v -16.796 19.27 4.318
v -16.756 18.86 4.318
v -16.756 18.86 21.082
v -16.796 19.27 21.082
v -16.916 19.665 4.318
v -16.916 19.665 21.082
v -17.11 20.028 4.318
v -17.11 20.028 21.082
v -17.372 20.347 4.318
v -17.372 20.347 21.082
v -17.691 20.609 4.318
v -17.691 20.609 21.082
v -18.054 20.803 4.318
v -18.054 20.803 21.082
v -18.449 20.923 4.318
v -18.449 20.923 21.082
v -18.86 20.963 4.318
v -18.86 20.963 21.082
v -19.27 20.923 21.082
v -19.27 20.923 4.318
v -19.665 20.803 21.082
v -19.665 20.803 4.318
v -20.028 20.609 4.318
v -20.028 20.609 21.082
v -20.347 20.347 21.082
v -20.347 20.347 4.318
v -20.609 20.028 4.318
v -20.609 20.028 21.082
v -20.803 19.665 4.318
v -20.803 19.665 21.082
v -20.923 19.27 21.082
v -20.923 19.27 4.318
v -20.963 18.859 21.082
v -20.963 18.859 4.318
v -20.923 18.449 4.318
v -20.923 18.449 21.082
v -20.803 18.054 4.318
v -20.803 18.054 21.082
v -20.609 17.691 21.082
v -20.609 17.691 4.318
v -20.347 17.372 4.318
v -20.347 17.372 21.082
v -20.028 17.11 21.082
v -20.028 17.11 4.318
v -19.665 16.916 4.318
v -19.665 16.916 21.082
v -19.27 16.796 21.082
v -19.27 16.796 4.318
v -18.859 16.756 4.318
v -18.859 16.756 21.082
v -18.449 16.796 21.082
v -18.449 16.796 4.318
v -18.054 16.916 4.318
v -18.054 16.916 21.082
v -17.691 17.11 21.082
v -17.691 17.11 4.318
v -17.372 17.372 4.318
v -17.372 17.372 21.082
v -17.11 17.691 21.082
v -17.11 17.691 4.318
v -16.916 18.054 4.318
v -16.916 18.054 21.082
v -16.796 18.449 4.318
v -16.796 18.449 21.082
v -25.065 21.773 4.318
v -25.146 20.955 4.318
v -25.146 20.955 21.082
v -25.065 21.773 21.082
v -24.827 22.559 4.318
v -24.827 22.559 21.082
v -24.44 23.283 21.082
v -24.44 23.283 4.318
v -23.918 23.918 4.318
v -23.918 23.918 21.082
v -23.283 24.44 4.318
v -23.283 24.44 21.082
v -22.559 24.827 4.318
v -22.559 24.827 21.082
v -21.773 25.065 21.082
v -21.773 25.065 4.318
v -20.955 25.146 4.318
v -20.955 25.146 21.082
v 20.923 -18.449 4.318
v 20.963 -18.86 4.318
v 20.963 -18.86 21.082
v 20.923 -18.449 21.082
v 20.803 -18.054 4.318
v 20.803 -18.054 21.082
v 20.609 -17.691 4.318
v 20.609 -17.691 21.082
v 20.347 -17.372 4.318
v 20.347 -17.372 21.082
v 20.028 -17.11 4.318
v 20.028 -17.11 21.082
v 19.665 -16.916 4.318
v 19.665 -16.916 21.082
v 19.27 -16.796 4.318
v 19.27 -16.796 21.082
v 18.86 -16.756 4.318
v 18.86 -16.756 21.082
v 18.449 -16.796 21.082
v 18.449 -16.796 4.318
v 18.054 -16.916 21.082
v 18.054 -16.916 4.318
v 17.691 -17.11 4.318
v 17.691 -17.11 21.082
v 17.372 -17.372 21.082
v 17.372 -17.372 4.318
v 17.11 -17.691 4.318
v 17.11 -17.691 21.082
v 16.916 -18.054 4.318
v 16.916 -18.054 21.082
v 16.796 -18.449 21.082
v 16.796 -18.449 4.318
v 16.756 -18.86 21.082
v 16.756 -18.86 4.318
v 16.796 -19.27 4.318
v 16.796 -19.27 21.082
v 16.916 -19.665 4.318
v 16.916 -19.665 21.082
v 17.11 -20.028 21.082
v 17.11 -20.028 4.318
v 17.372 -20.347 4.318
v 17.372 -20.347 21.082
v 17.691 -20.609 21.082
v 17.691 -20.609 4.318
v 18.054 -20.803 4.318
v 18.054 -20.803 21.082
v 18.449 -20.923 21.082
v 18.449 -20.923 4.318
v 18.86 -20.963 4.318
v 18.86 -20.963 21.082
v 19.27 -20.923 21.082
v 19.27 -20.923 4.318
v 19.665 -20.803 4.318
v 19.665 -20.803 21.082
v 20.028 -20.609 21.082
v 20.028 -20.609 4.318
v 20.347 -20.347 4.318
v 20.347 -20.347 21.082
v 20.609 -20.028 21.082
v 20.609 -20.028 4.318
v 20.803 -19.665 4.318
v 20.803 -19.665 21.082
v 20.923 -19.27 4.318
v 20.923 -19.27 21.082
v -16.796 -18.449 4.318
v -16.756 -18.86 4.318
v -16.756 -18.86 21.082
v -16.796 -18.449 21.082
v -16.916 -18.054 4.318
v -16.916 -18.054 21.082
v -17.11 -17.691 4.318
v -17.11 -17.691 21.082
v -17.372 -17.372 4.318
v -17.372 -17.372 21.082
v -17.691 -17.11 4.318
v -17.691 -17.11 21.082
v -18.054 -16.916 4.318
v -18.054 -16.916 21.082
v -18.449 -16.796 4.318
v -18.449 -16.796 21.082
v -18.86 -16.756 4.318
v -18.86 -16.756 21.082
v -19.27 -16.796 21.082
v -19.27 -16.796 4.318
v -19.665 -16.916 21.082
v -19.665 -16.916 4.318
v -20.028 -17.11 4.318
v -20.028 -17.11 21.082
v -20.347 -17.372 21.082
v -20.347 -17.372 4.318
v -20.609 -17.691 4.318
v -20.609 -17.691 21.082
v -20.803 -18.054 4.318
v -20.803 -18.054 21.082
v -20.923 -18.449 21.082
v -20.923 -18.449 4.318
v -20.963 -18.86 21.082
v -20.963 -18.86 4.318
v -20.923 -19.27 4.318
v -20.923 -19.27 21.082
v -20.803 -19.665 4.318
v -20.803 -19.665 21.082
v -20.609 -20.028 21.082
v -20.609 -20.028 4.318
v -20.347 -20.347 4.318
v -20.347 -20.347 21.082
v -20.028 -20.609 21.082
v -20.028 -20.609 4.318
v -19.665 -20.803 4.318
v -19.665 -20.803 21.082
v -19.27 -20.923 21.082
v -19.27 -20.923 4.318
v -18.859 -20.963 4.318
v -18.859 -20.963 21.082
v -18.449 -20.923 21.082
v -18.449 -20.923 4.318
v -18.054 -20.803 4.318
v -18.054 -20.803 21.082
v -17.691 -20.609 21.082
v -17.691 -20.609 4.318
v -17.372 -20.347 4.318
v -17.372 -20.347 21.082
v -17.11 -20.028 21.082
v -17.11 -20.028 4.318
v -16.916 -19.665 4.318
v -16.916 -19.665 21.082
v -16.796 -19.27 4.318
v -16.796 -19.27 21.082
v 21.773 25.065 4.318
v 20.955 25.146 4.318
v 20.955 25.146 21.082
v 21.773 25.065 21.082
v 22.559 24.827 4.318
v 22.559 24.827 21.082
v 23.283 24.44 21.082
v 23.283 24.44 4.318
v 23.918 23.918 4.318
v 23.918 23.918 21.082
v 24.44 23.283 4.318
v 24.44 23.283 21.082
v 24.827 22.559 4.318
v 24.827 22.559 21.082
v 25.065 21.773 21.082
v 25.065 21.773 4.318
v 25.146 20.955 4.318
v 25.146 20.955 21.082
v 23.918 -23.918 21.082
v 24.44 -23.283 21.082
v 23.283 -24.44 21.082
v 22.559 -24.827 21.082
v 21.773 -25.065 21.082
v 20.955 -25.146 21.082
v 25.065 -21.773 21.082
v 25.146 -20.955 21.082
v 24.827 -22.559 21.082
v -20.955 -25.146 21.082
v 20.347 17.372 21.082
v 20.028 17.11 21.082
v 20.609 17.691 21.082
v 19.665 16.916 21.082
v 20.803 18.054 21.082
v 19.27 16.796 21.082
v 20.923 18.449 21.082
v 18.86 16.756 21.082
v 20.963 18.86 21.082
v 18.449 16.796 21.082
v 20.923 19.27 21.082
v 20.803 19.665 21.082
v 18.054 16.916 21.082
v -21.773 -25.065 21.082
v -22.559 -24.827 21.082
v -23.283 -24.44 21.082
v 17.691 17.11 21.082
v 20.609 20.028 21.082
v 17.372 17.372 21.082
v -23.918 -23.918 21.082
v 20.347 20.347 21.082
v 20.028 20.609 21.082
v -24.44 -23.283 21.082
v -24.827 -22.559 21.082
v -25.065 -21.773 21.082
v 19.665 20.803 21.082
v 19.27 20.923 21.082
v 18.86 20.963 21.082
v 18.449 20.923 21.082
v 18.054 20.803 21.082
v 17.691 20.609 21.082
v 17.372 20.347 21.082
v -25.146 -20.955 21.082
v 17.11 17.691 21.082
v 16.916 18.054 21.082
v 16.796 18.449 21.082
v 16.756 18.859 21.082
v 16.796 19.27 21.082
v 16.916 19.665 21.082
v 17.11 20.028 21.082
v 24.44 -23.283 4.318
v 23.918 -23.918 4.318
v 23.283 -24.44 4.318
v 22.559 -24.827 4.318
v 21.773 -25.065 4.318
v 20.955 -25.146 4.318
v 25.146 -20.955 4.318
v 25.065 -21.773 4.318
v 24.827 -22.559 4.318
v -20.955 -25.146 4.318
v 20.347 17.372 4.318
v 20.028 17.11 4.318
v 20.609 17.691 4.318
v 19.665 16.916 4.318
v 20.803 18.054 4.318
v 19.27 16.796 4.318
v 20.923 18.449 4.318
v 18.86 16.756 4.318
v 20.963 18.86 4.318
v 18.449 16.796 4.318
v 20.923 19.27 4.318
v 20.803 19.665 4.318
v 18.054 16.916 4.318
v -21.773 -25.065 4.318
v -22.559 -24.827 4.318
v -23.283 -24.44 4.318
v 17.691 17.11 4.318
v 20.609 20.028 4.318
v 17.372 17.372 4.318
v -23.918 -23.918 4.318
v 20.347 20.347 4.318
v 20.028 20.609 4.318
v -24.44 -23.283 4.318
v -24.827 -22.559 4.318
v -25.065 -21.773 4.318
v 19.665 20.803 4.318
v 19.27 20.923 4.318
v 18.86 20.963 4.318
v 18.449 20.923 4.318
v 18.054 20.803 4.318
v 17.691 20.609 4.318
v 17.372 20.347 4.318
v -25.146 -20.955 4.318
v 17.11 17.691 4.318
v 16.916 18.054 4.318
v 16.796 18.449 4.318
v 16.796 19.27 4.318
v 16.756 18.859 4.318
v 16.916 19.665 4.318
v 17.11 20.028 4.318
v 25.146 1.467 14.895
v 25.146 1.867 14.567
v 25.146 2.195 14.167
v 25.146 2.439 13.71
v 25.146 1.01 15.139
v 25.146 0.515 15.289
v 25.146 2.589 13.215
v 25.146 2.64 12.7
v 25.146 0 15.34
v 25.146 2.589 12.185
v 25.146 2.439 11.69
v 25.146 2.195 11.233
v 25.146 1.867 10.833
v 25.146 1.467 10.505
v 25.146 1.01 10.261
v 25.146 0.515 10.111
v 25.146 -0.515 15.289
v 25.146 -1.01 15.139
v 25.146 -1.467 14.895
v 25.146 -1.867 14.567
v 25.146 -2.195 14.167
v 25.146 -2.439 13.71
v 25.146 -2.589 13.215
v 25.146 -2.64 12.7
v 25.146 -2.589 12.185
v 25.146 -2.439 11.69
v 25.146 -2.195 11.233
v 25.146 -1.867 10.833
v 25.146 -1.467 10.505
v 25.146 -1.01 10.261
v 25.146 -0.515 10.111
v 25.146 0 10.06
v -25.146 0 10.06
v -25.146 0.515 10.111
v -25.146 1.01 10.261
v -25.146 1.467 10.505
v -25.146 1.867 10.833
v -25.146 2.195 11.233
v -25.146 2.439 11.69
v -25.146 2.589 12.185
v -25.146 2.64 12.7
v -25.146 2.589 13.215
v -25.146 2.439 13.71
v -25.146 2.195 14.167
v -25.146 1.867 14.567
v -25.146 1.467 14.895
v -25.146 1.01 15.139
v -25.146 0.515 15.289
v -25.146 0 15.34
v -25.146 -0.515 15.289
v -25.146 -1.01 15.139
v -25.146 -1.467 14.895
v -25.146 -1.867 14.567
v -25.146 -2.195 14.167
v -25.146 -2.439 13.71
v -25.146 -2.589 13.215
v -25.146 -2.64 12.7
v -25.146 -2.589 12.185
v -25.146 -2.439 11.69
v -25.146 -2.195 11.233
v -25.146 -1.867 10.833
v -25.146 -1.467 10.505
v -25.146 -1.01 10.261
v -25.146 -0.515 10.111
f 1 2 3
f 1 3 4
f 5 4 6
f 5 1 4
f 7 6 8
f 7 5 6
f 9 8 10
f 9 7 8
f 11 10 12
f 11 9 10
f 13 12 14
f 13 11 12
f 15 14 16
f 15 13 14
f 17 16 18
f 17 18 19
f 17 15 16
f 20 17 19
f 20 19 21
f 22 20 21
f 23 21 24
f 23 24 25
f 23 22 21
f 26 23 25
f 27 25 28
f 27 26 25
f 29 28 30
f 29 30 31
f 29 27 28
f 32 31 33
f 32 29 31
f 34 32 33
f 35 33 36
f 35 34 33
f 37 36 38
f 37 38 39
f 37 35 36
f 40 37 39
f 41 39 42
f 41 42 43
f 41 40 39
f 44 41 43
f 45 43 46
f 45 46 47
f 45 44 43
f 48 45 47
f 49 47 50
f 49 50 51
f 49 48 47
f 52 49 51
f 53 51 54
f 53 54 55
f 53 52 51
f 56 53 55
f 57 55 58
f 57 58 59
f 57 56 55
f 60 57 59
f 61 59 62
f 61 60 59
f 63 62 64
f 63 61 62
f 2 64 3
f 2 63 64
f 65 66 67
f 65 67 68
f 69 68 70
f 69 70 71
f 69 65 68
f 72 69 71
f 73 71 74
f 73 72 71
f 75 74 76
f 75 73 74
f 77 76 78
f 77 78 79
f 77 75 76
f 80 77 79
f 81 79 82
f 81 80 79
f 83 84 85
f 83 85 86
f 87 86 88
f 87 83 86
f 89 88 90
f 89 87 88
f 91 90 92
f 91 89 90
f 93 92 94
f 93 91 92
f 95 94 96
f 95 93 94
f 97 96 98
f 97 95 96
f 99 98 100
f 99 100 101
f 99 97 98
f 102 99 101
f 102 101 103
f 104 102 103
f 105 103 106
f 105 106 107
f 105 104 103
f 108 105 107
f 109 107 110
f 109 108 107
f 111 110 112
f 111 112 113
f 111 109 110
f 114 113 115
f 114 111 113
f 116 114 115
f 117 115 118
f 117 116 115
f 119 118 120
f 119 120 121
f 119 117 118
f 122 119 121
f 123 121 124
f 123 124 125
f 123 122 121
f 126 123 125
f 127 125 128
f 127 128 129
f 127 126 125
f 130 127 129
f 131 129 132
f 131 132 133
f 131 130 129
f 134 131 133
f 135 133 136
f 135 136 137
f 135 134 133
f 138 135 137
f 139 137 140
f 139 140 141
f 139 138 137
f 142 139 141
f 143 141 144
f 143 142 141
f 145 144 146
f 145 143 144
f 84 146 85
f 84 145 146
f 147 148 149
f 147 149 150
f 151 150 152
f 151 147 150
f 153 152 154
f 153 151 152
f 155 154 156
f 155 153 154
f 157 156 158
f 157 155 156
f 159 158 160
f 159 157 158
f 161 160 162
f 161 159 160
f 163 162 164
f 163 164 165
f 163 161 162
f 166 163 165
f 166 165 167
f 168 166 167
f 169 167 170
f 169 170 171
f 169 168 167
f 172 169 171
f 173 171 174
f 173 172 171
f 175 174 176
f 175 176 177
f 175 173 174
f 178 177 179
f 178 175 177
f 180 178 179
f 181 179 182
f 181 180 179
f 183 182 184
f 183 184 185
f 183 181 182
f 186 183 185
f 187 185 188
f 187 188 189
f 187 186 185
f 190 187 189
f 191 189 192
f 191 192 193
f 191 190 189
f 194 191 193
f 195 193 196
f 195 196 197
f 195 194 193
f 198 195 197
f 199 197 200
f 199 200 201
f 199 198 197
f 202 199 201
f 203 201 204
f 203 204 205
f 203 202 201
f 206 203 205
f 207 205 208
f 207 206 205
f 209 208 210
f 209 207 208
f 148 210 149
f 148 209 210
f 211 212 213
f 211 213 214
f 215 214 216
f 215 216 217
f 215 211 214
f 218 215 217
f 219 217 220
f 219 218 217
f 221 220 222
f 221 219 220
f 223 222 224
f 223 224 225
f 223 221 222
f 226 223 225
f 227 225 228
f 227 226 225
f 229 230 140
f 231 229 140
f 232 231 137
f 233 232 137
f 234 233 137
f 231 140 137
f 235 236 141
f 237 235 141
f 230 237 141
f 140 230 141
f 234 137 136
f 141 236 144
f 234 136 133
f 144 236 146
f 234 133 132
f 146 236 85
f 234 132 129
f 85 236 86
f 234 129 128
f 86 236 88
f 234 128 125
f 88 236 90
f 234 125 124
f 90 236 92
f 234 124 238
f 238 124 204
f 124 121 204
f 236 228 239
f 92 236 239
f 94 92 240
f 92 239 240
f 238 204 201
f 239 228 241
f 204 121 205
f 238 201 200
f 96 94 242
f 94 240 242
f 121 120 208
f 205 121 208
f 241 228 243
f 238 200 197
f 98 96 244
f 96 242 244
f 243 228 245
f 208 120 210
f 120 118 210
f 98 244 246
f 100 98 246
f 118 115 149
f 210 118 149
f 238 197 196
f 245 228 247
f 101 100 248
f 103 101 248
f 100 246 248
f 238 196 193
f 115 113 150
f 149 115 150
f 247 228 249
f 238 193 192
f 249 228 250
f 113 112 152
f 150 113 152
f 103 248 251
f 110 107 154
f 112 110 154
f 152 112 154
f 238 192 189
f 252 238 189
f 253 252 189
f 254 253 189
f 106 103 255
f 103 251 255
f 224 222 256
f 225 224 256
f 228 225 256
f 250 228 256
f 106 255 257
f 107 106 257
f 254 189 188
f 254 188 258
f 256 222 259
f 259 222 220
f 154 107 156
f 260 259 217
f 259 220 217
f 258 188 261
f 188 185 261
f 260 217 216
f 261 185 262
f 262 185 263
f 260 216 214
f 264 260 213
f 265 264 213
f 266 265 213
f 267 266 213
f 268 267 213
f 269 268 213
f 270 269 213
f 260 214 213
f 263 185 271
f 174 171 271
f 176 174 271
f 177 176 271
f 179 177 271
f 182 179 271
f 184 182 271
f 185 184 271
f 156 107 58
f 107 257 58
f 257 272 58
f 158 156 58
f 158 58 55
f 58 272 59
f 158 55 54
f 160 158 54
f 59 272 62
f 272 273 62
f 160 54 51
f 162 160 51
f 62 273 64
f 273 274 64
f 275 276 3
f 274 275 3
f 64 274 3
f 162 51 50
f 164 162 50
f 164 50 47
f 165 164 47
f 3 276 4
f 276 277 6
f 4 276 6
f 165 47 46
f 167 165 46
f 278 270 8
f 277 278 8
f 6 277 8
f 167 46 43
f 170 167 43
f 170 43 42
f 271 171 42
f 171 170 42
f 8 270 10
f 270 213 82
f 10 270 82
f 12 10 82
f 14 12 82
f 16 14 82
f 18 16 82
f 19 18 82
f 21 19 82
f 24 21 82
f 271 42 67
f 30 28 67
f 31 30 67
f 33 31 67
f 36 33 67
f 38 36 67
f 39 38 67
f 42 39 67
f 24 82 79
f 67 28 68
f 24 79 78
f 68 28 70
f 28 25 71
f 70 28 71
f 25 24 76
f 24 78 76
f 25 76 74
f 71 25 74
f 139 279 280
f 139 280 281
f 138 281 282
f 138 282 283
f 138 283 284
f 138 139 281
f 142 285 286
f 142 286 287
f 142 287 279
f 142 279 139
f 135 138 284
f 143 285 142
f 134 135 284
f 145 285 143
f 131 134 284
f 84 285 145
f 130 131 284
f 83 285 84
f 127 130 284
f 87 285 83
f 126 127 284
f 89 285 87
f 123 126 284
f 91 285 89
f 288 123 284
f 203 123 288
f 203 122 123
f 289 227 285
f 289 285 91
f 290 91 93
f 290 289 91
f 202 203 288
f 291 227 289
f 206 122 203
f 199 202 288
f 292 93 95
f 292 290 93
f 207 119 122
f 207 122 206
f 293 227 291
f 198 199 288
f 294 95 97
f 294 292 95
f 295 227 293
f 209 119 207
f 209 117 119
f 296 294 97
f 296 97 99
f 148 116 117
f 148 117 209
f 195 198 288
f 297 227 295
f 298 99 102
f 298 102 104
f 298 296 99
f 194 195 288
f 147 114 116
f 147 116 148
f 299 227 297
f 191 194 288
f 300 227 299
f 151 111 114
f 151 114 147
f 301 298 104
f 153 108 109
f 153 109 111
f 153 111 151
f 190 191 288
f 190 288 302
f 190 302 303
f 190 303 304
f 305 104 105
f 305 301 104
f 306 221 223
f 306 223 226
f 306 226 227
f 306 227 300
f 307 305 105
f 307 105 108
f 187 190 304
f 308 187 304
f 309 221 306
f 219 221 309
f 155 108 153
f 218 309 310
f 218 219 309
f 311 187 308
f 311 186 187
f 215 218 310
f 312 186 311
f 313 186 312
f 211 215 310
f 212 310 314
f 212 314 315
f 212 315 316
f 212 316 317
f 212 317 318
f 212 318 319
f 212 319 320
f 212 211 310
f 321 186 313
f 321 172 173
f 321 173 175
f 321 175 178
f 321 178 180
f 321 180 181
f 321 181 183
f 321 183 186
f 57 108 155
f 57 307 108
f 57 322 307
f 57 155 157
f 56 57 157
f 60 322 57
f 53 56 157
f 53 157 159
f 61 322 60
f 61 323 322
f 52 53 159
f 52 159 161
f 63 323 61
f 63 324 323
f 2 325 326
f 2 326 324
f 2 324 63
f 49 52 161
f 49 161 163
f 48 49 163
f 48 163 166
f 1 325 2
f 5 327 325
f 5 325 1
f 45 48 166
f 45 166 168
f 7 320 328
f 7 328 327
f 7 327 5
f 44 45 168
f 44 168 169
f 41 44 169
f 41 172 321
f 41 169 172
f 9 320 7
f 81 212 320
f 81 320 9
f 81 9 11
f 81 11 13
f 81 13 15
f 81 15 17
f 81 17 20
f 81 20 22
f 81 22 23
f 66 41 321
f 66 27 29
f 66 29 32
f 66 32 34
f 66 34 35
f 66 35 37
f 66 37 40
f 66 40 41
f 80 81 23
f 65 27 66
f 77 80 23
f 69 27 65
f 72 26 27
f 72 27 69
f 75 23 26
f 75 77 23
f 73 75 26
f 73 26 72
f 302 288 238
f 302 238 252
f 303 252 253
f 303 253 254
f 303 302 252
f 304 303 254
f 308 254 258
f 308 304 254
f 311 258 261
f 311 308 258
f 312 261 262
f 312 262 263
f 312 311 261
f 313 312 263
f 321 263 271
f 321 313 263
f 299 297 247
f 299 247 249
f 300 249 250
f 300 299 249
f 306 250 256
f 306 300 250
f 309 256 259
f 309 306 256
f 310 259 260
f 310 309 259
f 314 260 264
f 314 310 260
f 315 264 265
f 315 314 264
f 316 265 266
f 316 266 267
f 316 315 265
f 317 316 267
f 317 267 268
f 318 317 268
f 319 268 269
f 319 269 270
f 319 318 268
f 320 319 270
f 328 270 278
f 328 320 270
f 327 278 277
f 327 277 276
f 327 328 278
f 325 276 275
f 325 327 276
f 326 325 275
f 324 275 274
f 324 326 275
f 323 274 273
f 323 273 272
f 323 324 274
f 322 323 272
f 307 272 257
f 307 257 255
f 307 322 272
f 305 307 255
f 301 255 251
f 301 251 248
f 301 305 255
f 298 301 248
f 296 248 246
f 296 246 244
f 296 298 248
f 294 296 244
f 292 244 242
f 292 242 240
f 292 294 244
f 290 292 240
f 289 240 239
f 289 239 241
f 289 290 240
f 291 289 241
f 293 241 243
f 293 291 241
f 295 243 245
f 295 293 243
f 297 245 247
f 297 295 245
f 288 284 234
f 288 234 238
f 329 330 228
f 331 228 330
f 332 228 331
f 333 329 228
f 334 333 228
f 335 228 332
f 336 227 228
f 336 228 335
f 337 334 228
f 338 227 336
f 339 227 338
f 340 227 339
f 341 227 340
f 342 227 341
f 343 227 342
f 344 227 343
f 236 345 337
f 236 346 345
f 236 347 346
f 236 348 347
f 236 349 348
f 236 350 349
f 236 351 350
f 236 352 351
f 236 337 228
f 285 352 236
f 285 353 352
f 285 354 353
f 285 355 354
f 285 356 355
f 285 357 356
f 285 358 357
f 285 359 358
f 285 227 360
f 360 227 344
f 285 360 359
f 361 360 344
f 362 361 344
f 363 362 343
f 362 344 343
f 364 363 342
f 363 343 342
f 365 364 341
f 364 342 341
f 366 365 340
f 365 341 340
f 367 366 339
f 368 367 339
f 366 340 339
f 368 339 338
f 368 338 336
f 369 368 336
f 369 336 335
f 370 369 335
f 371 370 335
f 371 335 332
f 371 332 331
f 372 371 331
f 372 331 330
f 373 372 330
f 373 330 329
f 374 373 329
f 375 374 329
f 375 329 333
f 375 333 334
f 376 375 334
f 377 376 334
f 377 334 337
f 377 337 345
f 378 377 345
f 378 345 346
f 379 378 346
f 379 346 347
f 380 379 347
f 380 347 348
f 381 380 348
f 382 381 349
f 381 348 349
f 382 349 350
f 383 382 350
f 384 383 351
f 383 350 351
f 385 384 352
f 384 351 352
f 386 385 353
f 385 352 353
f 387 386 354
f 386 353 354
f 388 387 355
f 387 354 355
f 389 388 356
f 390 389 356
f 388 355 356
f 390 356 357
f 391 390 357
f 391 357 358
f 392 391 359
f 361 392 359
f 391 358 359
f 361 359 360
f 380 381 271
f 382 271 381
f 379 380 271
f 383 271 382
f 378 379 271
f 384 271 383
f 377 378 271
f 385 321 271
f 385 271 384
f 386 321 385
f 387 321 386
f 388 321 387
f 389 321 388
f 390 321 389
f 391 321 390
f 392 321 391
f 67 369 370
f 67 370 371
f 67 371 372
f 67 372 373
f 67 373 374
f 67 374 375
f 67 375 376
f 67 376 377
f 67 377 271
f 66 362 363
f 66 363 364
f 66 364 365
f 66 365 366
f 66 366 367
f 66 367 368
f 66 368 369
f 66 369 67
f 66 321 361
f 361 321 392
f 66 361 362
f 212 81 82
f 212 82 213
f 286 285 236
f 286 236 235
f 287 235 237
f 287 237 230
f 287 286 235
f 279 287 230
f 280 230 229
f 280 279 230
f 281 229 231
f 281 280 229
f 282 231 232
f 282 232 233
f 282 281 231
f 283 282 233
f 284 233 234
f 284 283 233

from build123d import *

# Parameters (mm, degrees)
SKETCH1_R           = 3.1877
BOSS_EXTRUDE1_DEPTH = 25.4
SKETCH3_R           = 4
CUT_EXTRUDE1_DEPTH  = 89.9
SCALE1_SCALE        = 0.66


with BuildPart() as part:
    # Sketch1 → Boss-Extrude1 (new body)
    with BuildSketch(Plane.XY):
        with BuildLine():
            Line((-31.75, 38.1), (31.75, 38.1))
            ThreePointArc((31.75, 38.1), (36.240128061, 36.240128061), (38.1, 31.75))
            Line((38.1, 31.75), (38.1, -31.75))
            ThreePointArc((38.1, -31.75), (36.240128061, -36.240128061), (31.75, -38.1))
            Line((31.75, -38.1), (-31.75, -38.1))
            ThreePointArc((-31.75, -38.1), (-36.240128061, -36.240128061), (-38.1, -31.75))
            Line((-38.1, -31.75), (-38.1, 31.75))
            ThreePointArc((-38.1, 31.75), (-36.240128061, 36.240128061), (-31.75, 38.1))
        make_face()
        with Locations((-28.575, 28.575)):
            Circle(SKETCH1_R, mode=Mode.SUBTRACT)
        with Locations((28.575, 28.575)):
            Circle(SKETCH1_R, mode=Mode.SUBTRACT)
        with Locations((28.575, -28.575)):
            Circle(SKETCH1_R, mode=Mode.SUBTRACT)
        with Locations((-28.575, -28.575)):
            Circle(SKETCH1_R, mode=Mode.SUBTRACT)
    extrude(amount=BOSS_EXTRUDE1_DEPTH)

    # Sketch3 → Cut-Extrude1 (cut, through all)
    with BuildSketch(Plane(origin=(38.1, 0, 0), x_dir=(0, 0, -1), z_dir=(1, 0, 0))):
        with Locations((-12.7, 0)):
            Circle(SKETCH3_R)
    extrude(amount=-CUT_EXTRUDE1_DEPTH, mode=Mode.SUBTRACT)


with BuildPart() as part_1:
    # Scale1: scaled about (0, 0, 12.7)
    add(part.part.scale(SCALE1_SCALE).moved(Location((0, 0, 4.318))))


solid = part_1.part
